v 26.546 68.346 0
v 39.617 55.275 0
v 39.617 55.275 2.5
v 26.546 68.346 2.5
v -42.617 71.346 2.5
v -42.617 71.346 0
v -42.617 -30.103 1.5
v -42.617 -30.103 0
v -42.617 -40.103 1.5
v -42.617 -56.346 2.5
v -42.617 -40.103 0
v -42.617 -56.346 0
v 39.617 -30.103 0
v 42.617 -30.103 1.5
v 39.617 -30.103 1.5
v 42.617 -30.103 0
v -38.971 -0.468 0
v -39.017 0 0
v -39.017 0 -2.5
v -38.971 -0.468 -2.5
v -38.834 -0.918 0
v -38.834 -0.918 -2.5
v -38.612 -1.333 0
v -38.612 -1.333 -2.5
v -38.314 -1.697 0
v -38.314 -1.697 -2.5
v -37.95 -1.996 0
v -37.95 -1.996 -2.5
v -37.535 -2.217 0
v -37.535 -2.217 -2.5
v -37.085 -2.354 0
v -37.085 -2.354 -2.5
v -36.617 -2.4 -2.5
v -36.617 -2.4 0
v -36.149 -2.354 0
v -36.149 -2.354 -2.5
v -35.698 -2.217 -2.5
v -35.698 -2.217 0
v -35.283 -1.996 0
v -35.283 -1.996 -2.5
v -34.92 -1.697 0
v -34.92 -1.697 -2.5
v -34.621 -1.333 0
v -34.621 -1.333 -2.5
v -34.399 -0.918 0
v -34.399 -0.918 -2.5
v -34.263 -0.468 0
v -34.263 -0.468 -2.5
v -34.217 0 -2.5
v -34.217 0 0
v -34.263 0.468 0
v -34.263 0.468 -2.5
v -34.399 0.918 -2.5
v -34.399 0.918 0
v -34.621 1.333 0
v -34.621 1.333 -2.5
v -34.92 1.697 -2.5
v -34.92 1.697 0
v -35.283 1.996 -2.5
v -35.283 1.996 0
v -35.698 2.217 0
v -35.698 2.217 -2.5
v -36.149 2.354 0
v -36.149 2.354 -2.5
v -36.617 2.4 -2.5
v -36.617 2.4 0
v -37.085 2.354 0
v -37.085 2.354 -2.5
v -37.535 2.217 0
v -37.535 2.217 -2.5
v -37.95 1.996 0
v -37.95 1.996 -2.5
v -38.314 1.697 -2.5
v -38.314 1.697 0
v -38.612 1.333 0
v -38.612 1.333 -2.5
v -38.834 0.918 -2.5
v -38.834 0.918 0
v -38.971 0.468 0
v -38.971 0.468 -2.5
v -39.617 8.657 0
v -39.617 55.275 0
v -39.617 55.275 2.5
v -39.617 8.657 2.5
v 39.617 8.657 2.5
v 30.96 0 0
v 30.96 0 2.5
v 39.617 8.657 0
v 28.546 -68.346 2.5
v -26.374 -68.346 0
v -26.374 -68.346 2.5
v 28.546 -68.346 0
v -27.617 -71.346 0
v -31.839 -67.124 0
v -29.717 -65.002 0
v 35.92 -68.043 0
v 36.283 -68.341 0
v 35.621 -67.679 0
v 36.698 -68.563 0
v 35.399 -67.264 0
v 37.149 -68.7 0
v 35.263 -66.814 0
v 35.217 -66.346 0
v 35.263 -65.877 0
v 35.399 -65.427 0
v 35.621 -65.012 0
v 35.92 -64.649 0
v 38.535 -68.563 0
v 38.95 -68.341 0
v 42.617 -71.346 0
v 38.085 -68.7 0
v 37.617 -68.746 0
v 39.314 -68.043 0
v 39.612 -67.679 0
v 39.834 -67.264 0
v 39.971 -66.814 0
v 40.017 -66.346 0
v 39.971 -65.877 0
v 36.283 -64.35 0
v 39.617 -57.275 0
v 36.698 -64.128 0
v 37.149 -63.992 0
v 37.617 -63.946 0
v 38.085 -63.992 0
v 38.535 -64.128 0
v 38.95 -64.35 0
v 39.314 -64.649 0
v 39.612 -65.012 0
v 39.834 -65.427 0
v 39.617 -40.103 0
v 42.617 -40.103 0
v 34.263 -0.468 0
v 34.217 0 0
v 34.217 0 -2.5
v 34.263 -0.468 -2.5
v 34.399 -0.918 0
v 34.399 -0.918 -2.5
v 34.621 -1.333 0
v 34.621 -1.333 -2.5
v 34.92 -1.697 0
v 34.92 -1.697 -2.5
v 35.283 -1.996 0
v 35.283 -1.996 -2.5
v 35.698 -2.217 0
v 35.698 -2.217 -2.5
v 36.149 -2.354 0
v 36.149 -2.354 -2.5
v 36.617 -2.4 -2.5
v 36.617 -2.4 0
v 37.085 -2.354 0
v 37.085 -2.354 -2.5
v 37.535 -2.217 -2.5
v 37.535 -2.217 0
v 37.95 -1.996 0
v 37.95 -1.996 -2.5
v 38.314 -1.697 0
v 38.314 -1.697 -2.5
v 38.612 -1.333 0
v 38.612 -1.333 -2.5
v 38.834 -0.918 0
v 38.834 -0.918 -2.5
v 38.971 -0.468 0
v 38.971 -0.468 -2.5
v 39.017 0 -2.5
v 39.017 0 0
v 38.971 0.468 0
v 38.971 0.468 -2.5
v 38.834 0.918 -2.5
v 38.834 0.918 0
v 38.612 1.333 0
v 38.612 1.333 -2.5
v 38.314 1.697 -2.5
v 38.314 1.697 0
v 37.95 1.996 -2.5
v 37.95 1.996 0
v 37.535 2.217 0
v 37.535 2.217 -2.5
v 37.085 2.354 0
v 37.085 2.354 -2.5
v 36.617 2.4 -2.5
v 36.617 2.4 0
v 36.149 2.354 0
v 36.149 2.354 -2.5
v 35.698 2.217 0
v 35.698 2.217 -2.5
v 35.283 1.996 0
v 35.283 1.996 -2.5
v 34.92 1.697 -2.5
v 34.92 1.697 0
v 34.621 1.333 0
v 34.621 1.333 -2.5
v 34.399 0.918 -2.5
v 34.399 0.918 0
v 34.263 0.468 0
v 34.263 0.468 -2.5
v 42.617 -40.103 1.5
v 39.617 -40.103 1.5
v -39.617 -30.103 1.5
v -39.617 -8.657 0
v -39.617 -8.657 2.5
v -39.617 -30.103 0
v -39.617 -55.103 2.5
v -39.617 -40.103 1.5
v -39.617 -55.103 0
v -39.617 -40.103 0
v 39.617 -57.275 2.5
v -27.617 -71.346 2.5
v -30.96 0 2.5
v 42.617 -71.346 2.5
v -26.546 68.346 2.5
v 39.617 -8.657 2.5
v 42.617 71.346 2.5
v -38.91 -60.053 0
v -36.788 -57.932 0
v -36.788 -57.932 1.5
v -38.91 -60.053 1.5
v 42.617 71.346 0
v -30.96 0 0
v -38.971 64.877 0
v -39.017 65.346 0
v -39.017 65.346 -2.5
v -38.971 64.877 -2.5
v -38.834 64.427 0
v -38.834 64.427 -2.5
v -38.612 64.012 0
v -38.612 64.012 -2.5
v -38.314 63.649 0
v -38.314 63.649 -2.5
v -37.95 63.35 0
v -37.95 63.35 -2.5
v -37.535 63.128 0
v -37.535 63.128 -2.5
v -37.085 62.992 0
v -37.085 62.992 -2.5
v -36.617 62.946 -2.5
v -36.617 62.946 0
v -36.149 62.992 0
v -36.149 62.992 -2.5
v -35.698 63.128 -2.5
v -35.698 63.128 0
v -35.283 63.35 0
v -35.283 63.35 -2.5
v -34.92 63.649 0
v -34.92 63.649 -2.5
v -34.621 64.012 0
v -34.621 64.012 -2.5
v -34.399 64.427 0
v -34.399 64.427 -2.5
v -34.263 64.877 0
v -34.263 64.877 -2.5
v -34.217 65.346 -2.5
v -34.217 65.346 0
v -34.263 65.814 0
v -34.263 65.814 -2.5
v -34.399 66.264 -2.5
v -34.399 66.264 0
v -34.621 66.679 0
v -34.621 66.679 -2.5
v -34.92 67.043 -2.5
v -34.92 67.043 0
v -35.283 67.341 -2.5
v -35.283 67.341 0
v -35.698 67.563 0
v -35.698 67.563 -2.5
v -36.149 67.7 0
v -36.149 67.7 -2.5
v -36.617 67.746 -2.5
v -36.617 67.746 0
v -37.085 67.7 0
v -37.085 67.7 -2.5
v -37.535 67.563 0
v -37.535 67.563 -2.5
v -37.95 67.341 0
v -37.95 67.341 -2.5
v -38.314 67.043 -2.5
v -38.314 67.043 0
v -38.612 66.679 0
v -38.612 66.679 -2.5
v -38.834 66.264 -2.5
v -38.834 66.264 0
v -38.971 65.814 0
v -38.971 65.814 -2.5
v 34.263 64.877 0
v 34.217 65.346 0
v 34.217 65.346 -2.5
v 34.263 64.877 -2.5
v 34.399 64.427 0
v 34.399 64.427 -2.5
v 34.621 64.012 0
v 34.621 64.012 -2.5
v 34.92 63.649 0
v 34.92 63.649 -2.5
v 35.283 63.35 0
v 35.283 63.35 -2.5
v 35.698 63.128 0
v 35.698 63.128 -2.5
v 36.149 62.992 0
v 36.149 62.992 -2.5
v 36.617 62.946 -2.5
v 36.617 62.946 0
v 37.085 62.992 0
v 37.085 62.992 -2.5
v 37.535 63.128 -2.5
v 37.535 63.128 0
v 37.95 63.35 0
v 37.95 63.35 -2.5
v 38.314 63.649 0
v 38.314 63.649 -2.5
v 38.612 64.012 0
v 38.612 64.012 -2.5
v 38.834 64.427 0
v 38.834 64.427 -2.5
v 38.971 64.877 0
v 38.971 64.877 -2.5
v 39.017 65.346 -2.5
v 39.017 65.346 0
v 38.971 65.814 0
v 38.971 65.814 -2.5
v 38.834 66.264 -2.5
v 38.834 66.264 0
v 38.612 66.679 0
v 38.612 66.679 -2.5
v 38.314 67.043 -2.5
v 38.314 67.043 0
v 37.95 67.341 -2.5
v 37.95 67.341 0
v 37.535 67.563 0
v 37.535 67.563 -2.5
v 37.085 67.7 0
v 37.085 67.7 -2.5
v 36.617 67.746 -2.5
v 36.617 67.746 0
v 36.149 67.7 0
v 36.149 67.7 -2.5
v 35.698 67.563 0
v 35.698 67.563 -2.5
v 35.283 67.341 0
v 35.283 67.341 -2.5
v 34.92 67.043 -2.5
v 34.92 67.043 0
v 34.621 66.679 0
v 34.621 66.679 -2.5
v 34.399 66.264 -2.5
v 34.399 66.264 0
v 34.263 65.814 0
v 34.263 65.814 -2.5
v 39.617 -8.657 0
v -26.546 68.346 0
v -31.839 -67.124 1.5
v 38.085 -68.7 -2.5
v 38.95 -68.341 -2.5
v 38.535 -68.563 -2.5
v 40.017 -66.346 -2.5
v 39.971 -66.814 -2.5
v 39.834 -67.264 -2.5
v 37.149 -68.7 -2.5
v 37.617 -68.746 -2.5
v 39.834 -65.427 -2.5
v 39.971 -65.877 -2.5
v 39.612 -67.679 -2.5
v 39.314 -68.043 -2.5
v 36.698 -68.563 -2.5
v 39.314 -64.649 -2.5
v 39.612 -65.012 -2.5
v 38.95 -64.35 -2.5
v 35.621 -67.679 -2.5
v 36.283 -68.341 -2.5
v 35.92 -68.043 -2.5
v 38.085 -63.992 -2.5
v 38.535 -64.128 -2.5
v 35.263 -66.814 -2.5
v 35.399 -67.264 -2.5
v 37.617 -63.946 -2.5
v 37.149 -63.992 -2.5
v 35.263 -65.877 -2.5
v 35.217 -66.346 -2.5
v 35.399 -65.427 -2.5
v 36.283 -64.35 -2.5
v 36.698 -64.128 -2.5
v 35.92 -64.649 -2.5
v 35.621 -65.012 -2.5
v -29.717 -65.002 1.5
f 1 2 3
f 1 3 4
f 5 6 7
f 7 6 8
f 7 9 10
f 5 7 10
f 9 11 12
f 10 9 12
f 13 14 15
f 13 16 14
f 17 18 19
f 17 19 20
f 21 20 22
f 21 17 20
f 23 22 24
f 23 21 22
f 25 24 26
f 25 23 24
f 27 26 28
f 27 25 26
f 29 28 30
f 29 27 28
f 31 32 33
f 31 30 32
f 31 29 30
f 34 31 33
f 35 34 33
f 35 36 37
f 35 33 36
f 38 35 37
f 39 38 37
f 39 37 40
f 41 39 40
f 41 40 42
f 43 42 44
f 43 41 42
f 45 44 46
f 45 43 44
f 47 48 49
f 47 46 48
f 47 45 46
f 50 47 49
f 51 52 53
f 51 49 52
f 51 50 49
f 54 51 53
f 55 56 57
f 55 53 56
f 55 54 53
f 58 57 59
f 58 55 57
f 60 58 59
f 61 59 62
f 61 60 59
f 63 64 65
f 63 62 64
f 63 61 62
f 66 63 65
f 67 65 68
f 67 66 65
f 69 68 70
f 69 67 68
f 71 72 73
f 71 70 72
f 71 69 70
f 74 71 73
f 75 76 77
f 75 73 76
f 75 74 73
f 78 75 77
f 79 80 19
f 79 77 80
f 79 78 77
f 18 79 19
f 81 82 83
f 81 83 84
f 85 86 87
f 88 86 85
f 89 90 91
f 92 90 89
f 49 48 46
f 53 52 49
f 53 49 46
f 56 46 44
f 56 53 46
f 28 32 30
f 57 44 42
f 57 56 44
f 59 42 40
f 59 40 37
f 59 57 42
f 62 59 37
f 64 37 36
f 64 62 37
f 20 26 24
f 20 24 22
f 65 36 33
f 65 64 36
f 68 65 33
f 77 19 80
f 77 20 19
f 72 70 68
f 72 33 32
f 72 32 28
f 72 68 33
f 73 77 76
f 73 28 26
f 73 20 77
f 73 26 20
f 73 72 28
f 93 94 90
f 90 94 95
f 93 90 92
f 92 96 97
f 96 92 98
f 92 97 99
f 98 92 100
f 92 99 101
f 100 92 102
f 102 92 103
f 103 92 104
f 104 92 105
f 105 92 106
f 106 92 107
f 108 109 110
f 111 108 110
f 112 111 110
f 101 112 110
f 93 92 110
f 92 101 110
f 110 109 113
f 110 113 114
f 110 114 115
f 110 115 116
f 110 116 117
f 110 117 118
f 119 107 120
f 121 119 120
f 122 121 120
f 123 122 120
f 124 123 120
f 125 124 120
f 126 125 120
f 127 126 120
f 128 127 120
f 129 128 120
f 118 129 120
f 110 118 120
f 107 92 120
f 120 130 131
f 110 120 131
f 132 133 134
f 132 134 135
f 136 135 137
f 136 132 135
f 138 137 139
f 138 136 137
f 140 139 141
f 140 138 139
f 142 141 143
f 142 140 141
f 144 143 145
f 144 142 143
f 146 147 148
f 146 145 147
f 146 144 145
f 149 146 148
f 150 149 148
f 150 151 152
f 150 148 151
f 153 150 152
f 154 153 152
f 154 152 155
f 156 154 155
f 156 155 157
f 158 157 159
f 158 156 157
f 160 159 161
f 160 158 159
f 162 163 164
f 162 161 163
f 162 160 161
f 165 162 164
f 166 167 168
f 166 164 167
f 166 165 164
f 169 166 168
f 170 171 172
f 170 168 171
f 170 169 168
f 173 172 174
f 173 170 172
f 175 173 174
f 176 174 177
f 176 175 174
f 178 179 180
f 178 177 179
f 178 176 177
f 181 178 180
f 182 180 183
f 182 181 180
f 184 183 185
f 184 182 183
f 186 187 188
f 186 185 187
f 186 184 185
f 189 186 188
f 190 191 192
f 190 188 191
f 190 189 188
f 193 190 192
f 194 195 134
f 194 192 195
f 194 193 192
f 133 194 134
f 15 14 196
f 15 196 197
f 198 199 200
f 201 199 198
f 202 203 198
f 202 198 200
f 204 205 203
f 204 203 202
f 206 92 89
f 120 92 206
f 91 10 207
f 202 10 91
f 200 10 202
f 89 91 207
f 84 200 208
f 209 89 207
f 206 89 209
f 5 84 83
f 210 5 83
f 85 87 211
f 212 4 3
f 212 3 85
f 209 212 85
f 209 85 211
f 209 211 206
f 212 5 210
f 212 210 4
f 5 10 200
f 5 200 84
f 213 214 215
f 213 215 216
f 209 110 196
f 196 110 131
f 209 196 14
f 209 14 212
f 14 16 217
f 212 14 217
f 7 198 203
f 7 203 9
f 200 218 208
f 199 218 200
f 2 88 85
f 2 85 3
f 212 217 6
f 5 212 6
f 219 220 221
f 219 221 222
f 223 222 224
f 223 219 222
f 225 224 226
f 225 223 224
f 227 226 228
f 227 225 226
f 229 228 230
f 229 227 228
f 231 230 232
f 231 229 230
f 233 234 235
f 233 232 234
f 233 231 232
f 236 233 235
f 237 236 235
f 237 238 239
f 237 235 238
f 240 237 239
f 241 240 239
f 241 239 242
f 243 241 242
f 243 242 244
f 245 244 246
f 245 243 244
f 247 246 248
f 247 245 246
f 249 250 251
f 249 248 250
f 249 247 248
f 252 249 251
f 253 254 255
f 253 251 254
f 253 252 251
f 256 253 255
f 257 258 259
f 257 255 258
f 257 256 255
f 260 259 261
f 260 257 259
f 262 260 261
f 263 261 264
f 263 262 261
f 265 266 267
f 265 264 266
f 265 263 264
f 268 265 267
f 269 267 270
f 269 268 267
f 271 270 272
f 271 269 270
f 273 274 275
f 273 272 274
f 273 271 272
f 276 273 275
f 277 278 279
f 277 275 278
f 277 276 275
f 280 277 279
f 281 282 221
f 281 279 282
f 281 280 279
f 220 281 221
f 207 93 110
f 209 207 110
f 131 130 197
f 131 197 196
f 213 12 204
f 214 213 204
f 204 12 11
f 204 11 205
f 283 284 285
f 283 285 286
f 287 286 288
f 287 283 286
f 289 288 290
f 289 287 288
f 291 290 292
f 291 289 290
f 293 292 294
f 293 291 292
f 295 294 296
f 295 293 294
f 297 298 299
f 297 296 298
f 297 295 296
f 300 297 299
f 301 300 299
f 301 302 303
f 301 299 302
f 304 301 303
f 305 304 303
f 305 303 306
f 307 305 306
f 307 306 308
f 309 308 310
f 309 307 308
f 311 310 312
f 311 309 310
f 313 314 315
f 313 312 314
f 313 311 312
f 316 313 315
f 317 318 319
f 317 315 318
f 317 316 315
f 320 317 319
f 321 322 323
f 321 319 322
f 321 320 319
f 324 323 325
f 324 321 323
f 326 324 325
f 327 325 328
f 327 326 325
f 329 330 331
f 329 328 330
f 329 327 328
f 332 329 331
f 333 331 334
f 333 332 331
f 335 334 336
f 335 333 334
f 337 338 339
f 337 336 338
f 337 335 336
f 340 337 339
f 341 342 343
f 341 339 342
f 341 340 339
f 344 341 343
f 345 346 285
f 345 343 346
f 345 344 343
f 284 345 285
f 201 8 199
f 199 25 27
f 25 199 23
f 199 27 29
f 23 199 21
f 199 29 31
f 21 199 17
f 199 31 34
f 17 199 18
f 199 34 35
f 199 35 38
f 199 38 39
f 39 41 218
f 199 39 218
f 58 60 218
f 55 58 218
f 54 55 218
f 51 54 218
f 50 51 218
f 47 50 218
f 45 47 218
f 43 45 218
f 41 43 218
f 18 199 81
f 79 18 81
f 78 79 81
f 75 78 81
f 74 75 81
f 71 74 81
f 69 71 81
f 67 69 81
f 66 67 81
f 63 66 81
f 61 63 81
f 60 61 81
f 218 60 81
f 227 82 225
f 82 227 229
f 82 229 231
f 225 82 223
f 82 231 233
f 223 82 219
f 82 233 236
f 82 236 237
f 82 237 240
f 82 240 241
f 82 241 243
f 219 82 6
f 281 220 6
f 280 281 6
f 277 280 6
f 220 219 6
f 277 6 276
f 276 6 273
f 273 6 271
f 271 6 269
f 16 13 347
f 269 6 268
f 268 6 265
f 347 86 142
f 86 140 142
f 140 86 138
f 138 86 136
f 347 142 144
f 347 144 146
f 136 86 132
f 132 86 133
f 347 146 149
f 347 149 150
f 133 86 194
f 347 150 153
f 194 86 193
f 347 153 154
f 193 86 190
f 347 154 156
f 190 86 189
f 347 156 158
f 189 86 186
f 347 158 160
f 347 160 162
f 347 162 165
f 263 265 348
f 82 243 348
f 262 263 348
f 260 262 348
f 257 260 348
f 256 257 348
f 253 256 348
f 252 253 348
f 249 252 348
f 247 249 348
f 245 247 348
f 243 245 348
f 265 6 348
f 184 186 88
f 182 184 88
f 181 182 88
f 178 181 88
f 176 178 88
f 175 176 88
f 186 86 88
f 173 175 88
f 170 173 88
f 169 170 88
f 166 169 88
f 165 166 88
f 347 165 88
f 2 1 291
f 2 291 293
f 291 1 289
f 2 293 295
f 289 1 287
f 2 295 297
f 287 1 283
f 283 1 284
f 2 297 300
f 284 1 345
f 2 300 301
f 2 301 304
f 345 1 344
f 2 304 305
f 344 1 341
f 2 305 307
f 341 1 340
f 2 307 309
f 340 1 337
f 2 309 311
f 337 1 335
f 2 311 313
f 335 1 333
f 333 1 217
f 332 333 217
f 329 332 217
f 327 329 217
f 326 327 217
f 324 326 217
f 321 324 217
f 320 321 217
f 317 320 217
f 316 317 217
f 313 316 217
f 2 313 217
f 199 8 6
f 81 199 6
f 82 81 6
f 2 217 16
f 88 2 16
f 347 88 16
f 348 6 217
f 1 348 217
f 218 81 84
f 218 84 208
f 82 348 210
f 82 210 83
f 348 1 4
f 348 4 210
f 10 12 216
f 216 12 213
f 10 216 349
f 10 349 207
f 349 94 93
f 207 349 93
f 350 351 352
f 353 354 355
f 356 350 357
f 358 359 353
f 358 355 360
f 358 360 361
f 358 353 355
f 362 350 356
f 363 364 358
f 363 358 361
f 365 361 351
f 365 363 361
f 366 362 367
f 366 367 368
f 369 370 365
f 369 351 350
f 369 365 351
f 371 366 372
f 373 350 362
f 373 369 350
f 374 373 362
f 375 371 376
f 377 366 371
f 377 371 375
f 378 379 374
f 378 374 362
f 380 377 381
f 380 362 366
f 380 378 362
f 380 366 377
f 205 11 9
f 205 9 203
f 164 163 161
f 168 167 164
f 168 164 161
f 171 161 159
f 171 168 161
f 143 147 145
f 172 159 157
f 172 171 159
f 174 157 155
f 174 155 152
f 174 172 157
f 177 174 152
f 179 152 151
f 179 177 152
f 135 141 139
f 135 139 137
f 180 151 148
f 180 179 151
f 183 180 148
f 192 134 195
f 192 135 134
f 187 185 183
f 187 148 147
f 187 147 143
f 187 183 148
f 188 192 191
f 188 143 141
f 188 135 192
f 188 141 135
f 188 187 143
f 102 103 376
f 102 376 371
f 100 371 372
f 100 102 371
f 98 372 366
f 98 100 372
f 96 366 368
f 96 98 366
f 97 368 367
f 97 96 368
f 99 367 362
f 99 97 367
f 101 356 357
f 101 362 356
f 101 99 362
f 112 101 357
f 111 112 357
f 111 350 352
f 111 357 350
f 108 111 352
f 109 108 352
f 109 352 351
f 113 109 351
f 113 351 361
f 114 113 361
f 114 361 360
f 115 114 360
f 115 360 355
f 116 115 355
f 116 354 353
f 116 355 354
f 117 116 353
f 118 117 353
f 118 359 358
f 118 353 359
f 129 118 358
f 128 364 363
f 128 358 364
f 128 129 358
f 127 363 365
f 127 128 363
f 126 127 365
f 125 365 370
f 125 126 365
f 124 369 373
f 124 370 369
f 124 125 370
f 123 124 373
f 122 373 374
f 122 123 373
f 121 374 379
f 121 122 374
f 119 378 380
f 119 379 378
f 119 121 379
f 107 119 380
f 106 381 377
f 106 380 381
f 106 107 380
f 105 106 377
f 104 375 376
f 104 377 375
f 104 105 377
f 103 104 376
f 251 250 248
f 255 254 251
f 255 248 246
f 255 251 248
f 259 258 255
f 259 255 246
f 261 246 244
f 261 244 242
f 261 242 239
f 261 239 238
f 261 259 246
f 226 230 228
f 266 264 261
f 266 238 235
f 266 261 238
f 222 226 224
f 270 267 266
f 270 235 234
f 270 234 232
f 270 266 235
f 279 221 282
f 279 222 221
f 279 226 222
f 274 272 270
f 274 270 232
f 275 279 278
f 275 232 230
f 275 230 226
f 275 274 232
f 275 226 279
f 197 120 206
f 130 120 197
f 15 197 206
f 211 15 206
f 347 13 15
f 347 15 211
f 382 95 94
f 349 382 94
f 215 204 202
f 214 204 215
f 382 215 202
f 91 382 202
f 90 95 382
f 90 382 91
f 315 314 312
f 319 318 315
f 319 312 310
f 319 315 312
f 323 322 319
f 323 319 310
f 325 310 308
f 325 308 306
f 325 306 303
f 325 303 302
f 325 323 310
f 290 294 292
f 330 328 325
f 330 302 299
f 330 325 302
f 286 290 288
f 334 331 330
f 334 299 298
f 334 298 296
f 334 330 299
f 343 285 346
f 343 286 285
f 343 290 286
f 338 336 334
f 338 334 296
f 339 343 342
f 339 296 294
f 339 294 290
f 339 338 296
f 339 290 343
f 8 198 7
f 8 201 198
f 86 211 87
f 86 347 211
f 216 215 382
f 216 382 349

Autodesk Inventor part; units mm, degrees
ref_plane "YZ Plane" through (0, 0, 0) normal (1, 0, 0) x (0, 1, 0)
ref_plane "XZ Plane" through (0, 0, 0) normal (0, 1, 0) x (-1, 0, 0)
ref_plane "XY Plane" through (0, 0, 0) normal (0, 0, 1) x (1, 0, 0)
sketch "Skizze1" plane through (0, 0, 0) normal (0, 0, 1) x (1, 0, 0)
  line L0 (42.6168, 71.3457) -> (-42.6168, 71.3457) projected
  line L1 (-42.6168, 71.3457) -> (-42.6168, -71.3457) projected
  line L2 (42.6168, -71.3457) -> (42.6168, 71.3457) projected
  line L3 (-42.6168, -71.3457) -> (42.6168, -71.3457) projected
  line L4 (-18, -68.3457) -> (28.5457, -68.3457)
  line L5 (28.5457, -68.3457) -> (39.6168, -57.2746)
  line L6 (39.6168, -57.2746) -> (39.6168, -8.6569)
  line L7 (39.6168, 8.6569) -> (39.6168, 55.2746)
  line L8 (39.6168, 55.2746) -> (26.5457, 68.3457)
  line L9 (26.5457, 68.3457) -> (-26.5457, 68.3457)
  line L10 (-26.5457, 68.3457) -> (-39.6168, 55.2746)
  line L11 (-39.6168, 55.2746) -> (-39.6168, 8.6569)
  line L12 (-39.6168, 8.6569) -> (-30.9599, 0)
  line L13 (-30.9599, 0) -> (-39.6168, -8.6569)
  line L14 (-39.6168, -8.6569) -> (-39.6168, -55.103)
  line L15 (-39.6168, -55.103) -> (-26.3742, -68.3457)
  line L16 (-26.3742, -68.3457) -> (-18, -68.3457)
  line L17 (-42.6168, -56.3457) -> (-27.6168, -71.3457)
  circle A0 centre (37.6168, -66.3457) radius 2.5 construction
  circle A1 centre (36.6168, 0) radius 2.5 construction
  circle A2 centre (-36.6168, 0) radius 2.5 construction
  circle A3 centre (37.6168, -66.3457) radius 2.5 construction
  circle A4 centre (36.6168, 65.3457) radius 2.5 construction
  circle A5 centre (-36.6168, 65.3457) radius 2.5 construction
  line L18 (39.6168, -8.6569) -> (30.9599, 0)
  line L19 (30.9599, 0) -> (39.6168, 8.6569)
  point P0 (0, 0)
  dimension "d0" = 3
  dimension "d1" = 3
  dimension "d2" = 3
  dimension "d3" = 3
  dimension "d4" = 5
  dimension "d5" = 45
  dimension "d6" = 5
  dimension "d7" = 45
  dimension "d8" = 4
  dimension "d9" = 4
  dimension "d10" = 4
  dimension "d11" = 4
  dimension "d12" = 5
  dimension "d13" = 3
  dimension "d14" = 15
extrude "Extrusion1" add sketch "Skizze1" along normal blind 2.5 contours L2 L3 L17 L1 L0
sketch "Skizze2" plane through (0, 0, 0) normal (0, 0, -1) x (-1, 0, 0)
  circle A0 centre (-36.6168, 65.3457) radius 2.4 projected
  circle A1 centre (36.6168, 65.3457) radius 2.4 projected
  circle A2 centre (36.6168, 0) radius 2.4 projected
  circle A3 centre (-36.6168, 0) radius 2.4 projected
  circle A4 centre (-37.6168, -66.3457) radius 2.4 projected
  point P0 (0, 0)
extrude "Extrusion2" add sketch "Skizze2" along normal blind 2.5
sketch "Skizze3" plane through (0, 0, 0) normal (0, 0, -1) x (-1, 0, 0)
  line L0 (42.6168, 71.3457) -> (42.6168, -56.3457) projected
  line L1 (39.6168, -8.6569) -> (39.6168, -55.103) projected
  line L2 (42.6168, -40.103) -> (39.6168, -40.103)
  line L3 (39.6168, -40.103) -> (39.6168, -30.103)
  line L4 (39.6168, -30.103) -> (42.6168, -30.103)
  line L5 (42.6168, -30.103) -> (42.6168, -40.103)
  line L6 (-39.6168, -57.2746) -> (-39.6168, -8.6569) projected
  line L7 (-42.6168, -71.3457) -> (-42.6168, 71.3457) projected
  line L8 (-39.6168, -40.103) -> (-42.6168, -40.103)
  line L9 (-42.6168, -40.103) -> (-42.6168, -30.103)
  line L10 (-42.6168, -30.103) -> (-39.6168, -30.103)
  line L11 (-39.6168, -30.103) -> (-39.6168, -40.103)
  line L12 (39.6168, -55.103) -> (26.3742, -68.3457) projected
  line L13 (29.7173, -65.0025) -> (36.7884, -57.9315)
  line L14 (26.3742, -68.3457) -> (39.6168, -55.103) projected
  line L15 (36.7884, -57.9315) -> (38.9097, -60.0528)
  line L16 (42.6168, -56.3457) -> (27.6168, -71.3457) projected
  line L17 (38.9097, -60.0528) -> (31.8386, -67.1239)
  line L18 (29.7173, -65.0025) -> (31.8386, -67.1239)
  point P0 (0, 0)
  dimension "d19" = 10
  dimension "d20" = 15
  dimension "d21" = 10
  dimension "d22" = 4
extrude "Extrusion3" cut sketch "Skizze3" against normal blind 1.5 contours L0 L2 L1 L4 | L16 L18 L12 L15 | L8 L7 L10 L6
equation "\"d1\" = d0"
equation "\"d2\" = d0"
equation "\"d3\" = d0"
properties part number "Backplate"
